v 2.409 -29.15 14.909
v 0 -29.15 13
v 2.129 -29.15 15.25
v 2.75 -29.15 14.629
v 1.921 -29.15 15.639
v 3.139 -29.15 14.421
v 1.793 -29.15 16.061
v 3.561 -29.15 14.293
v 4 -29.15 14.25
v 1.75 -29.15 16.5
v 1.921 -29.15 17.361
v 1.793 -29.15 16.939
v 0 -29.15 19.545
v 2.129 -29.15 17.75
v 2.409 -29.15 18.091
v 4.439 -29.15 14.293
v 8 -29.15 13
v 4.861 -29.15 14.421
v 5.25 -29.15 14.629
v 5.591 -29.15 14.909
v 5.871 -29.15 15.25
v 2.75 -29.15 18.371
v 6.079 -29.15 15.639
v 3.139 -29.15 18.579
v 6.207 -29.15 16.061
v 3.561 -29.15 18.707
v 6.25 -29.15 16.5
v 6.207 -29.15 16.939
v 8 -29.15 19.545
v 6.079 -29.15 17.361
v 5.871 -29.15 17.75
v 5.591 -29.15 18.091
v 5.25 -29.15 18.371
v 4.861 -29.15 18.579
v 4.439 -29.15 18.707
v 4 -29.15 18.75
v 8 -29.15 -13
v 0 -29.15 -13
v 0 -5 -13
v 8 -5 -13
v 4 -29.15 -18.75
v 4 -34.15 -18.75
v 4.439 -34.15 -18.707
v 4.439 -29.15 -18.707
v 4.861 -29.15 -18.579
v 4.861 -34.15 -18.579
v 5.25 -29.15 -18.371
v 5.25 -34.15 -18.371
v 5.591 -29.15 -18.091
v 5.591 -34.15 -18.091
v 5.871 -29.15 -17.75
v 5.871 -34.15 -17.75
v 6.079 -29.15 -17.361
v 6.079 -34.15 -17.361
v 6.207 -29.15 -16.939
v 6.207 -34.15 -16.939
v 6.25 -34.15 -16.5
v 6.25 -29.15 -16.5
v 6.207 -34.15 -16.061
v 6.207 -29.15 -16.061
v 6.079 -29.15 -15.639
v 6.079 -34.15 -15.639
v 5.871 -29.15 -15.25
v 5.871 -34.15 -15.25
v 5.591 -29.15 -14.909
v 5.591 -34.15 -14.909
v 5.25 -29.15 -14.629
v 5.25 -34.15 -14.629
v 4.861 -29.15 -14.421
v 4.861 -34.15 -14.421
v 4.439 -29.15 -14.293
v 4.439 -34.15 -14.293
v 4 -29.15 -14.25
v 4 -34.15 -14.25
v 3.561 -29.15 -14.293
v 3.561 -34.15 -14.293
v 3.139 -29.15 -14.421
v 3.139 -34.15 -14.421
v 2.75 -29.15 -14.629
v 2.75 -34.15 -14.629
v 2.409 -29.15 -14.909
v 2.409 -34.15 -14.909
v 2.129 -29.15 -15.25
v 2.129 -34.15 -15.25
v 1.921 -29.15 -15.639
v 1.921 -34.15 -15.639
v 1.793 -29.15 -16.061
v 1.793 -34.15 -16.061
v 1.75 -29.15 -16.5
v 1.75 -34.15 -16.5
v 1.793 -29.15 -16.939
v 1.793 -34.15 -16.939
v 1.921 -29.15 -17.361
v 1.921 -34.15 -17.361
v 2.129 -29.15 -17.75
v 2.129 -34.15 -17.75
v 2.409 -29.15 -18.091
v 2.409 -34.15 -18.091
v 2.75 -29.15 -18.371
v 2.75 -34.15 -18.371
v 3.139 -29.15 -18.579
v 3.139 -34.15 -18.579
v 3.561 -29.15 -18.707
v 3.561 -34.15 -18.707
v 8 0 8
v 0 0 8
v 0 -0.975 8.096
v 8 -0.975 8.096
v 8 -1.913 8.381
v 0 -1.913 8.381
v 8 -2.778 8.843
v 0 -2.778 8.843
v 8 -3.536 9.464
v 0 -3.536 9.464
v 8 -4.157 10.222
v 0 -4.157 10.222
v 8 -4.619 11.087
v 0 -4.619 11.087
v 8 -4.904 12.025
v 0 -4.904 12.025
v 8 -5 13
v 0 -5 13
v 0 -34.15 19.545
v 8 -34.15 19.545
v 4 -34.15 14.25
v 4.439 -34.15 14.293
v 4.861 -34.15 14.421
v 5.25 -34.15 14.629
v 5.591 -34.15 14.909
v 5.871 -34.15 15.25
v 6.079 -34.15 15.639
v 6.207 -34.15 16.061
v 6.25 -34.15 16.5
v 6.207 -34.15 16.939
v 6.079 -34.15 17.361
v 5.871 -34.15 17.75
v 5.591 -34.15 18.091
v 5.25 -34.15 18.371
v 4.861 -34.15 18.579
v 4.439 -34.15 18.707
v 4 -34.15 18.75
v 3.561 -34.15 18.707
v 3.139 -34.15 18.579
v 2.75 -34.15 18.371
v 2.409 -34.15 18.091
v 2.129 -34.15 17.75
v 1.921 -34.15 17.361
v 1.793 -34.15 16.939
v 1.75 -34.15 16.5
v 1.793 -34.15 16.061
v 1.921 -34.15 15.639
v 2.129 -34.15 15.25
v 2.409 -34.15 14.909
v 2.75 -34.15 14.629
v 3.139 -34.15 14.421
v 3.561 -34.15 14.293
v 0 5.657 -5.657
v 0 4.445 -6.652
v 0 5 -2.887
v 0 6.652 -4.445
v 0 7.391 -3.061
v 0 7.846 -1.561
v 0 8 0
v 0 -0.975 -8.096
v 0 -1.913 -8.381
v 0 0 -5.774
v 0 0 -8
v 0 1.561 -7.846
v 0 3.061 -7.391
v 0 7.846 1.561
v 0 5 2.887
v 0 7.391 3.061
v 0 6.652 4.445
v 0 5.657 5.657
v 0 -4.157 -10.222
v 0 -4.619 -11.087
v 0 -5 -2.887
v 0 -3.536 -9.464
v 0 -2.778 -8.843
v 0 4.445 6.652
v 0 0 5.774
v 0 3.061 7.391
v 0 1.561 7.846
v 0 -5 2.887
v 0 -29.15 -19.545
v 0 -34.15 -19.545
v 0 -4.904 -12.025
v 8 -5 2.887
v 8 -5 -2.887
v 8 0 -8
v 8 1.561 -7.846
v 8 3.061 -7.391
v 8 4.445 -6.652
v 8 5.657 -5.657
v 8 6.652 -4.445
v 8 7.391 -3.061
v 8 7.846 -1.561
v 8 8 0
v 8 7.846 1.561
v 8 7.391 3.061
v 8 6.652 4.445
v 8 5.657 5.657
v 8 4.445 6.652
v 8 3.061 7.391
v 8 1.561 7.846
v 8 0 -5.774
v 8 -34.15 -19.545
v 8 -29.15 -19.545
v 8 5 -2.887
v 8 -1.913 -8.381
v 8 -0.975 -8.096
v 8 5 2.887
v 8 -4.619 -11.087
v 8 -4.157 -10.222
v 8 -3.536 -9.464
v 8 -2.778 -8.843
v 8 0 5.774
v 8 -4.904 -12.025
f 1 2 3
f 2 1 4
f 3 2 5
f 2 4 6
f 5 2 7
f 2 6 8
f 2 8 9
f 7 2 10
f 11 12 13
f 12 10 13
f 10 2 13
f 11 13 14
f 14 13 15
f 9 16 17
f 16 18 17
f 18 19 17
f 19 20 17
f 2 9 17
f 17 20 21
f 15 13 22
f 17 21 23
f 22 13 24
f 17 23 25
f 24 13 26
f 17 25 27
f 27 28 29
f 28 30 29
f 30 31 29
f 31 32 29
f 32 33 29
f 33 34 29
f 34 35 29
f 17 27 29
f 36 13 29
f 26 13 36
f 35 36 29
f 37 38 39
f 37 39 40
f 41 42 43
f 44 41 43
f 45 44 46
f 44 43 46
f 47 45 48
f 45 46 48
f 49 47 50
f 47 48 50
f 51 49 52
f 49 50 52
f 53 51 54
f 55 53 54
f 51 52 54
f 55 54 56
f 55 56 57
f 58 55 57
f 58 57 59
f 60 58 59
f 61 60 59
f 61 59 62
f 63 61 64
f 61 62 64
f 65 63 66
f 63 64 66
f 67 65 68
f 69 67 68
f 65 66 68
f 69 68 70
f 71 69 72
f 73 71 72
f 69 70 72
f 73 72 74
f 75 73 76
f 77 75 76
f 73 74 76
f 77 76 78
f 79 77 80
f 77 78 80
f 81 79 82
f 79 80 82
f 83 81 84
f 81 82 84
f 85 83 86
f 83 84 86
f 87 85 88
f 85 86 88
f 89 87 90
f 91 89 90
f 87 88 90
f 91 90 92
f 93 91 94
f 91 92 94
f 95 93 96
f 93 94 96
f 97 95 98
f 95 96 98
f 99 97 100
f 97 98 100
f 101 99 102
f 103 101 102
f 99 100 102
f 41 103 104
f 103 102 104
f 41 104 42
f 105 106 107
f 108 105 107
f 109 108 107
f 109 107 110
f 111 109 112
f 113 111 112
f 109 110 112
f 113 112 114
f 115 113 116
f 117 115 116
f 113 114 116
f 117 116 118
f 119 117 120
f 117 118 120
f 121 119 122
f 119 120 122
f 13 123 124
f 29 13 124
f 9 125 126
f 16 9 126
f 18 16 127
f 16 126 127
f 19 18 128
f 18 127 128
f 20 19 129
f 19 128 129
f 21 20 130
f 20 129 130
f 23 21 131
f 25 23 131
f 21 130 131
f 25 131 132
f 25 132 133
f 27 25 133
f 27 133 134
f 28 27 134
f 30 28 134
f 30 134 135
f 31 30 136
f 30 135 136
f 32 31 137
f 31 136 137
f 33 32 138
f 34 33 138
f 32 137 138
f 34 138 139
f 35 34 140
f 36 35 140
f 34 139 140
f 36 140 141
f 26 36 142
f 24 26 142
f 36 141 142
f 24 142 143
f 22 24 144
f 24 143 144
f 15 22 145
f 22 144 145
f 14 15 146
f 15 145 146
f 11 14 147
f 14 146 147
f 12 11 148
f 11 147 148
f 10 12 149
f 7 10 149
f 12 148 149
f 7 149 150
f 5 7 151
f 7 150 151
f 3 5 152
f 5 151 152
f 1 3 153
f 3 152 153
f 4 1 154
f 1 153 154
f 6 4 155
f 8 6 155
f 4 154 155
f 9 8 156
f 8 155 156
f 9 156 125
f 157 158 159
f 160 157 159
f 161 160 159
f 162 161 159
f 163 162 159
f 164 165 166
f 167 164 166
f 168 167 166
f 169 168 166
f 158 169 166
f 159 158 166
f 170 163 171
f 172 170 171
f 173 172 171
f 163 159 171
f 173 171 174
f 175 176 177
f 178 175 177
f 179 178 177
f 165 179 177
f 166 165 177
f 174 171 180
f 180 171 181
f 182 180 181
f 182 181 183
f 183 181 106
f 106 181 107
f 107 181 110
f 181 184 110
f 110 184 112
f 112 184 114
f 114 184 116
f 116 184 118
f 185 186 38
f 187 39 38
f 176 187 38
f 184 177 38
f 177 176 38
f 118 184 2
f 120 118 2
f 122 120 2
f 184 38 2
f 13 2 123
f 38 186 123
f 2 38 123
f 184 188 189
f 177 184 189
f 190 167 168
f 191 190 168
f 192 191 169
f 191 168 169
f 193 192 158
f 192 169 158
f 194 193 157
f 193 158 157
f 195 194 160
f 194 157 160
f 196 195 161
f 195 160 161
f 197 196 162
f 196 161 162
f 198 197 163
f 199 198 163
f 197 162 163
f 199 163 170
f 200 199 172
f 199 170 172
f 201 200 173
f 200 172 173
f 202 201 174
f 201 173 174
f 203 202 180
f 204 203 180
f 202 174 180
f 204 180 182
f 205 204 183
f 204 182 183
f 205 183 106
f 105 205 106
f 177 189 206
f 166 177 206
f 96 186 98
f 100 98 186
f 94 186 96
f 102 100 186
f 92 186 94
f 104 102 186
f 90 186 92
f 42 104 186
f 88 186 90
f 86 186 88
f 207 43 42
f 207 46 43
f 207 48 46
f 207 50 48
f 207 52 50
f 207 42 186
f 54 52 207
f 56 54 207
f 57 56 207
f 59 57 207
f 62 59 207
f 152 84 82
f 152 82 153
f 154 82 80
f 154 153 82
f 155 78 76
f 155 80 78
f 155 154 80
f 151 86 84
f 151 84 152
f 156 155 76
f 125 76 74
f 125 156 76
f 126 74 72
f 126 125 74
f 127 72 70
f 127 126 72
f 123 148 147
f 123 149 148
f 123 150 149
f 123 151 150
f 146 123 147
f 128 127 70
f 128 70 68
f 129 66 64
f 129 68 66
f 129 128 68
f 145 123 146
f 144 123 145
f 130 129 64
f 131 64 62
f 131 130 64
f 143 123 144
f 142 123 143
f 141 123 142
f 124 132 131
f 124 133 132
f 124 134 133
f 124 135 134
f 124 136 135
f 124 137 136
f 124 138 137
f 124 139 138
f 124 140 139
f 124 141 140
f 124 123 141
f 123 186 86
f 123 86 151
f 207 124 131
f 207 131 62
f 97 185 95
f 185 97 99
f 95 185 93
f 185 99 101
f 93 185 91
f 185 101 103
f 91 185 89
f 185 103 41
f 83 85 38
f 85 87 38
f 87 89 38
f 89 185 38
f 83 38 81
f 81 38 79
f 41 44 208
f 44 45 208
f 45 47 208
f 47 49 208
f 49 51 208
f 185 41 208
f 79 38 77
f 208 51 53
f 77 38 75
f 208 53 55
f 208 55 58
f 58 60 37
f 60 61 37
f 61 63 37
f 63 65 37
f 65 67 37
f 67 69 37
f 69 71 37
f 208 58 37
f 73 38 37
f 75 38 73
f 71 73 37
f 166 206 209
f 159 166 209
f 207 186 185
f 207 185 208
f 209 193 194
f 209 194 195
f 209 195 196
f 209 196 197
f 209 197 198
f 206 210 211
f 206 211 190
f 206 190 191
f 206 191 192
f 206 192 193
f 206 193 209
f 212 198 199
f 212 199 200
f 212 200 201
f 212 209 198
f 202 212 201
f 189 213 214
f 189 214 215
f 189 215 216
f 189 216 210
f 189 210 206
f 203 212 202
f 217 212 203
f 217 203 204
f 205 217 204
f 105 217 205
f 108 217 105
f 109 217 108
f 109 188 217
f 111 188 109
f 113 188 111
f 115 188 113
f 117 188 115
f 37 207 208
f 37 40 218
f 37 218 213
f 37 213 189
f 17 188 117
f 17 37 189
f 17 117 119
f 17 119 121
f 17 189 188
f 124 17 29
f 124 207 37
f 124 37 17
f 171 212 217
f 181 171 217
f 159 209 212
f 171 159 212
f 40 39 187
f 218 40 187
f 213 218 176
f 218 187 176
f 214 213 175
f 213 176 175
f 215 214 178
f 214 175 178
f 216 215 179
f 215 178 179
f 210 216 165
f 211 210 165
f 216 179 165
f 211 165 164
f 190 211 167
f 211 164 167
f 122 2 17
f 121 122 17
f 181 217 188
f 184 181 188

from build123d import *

# Parameters (mm, degrees)
EXTRUDE_1_DEPTH     = 8
CUT_EXTRUDE_1_DEPTH = 19.248287591
SKETCH_4_W          = 8
SKETCH_4_H          = 26
EXTRUDE_2_DEPTH     = 24.15
SKETCH_5_W          = 8
SKETCH_5_H          = 39.090909091
SKETCH_5_R          = 2.25
EXTRUDE_3_DEPTH     = 5


with BuildPart() as part:
    # Эскиз1 → Бобышка-Вытянуть1 (new body)
    with BuildSketch(Plane(origin=(0, 0, 0), x_dir=(0, 0, -1), z_dir=(1, 0, 0))):
        with BuildLine():
            Line((-13, -5), (-13, -10))
            Line((-13, -10), (13, -10))
            Line((13, -10), (13, -5))
            ThreePointArc((13, -5), (9.464466094, -3.535533906), (8, 0))
            ThreePointArc((8, 0), (0, 8), (-8, 0))
            ThreePointArc((-8, 0), (-9.464466094, -3.535533906), (-13, -5))
        make_face()
    extrude(amount=EXTRUDE_1_DEPTH)

    # Эскиз2 → Вырез-Вытянуть1 (cut, through all)
    with BuildSketch(Plane(origin=(8, 0, 0), x_dir=(0, 0, -1), z_dir=(1, 0, 0))):
        Polygon((5.773502692, 0), (2.886751346, 5), (-2.886751346, 5), (-5.773502692, 0), (-2.886751346, -5), (2.886751346, -5), align=None)
    extrude(amount=-CUT_EXTRUDE_1_DEPTH, mode=Mode.SUBTRACT)

    # Эскиз4 → Бобышка-Вытянуть2 (add)
    with BuildSketch(Plane.XZ.offset(10)):
        with Locations((4, 0)):
            Rectangle(SKETCH_4_W, SKETCH_4_H)
    extrude(amount=EXTRUDE_2_DEPTH)

    # Эскиз5 → Бобышка-Вытянуть3 (add)
    with BuildSketch(Plane.XZ.offset(34.15)):
        with Locations((4, -1e-09)):
            Rectangle(SKETCH_5_W, SKETCH_5_H)
        with Locations(Location((4, -16.5, 0), (0, 0, 270))):
            Circle(SKETCH_5_R, mode=Mode.SUBTRACT)
        with Locations(Location((4, 16.5, 0), (0, 0, 270))):
            Circle(SKETCH_5_R, mode=Mode.SUBTRACT)
    extrude(amount=-EXTRUDE_3_DEPTH)


solid = part.part
